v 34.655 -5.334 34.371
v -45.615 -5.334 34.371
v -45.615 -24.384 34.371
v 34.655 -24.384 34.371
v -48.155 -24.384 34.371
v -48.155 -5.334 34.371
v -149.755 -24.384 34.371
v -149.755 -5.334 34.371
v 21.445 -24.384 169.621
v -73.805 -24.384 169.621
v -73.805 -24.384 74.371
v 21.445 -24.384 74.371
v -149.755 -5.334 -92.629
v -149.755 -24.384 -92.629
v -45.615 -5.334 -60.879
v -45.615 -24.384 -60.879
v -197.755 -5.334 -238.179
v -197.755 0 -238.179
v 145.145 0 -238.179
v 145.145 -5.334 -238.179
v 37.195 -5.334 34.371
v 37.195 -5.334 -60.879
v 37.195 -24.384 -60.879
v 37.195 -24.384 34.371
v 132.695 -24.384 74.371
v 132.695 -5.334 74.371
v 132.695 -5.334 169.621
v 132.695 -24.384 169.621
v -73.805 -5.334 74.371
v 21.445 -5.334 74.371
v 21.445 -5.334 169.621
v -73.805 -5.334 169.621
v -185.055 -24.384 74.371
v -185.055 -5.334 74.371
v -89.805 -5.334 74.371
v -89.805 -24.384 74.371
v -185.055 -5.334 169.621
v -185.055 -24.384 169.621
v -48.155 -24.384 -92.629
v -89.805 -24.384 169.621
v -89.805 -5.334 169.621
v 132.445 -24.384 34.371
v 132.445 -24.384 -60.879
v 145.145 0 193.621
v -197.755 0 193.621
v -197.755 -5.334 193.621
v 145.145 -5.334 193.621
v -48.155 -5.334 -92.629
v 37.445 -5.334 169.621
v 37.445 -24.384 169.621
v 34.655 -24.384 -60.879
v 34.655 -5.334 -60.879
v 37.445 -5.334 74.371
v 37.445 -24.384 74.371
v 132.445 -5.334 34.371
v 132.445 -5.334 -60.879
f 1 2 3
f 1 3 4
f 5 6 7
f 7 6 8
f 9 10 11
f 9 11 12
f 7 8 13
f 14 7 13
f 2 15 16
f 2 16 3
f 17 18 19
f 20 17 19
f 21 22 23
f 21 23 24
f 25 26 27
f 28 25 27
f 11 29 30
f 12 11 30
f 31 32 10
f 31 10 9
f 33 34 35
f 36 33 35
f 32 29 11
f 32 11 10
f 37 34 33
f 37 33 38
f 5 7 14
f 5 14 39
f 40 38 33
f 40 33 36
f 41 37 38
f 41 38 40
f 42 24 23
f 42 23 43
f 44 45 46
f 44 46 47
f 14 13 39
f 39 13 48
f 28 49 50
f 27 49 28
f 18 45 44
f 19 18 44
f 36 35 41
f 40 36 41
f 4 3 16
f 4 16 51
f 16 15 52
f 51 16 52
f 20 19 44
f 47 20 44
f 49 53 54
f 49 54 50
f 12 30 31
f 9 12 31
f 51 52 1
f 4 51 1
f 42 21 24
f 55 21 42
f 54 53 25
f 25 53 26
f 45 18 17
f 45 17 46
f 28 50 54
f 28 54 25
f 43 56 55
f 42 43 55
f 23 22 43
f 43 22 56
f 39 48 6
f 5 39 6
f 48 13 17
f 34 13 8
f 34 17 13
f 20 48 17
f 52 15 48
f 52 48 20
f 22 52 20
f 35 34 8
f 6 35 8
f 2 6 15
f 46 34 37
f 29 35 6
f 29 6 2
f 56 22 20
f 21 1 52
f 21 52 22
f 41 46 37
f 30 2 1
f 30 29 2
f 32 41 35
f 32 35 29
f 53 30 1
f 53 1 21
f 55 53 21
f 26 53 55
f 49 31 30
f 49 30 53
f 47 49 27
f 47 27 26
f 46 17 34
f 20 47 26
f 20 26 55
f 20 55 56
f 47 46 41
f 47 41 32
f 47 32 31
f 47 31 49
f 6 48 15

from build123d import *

# Parameters (mm, degrees)
F0_W     = 342.9
F0_H     = 431.8
F1_DEPTH = 5.334
F2_W     = 95.25
F2_H     = 95.25
F2_W_2   = 80.27
F3_DEPTH = 19.05


# Not quite as in the source:
# - a feature names something its author has since deleted; it is built from what else it names


with BuildPart() as f1:
    # F0 (on Front) → F1 (new body)
    with BuildSketch(Plane.XZ):
        with Locations((-26.3048716933, -22.2786769863)):
            Rectangle(F0_W, F0_H)
    extrude(amount=F1_DEPTH)

    # F2 (on face) → F3 (join)
    with BuildSketch(Plane.XZ.offset(5.334)):
        with Locations((-137.4298716933, 121.9963230137)):
            Rectangle(F2_W, F2_H)
        with Locations((-26.1798716933, 121.9963230137)):
            Rectangle(F2_W, F2_H)
        with Locations((85.0701283067, 121.9963230137)):
            Rectangle(F2_W, F2_H)
        Polygon((-48.1548716933, 34.3713230137), (-149.7548716933, 34.3713230137), (-149.7548716933, -92.6286769863), (-48.1548716933, -92.6286769863), (-48.1548716933, -60.8786769863), align=None)
        with Locations((-5.4798716933, -13.2536769863)):
            Rectangle(F2_W_2, F2_H)
        with Locations((84.8201283067, -13.2536769863)):
            Rectangle(F2_W, F2_H)
    extrude(amount=F3_DEPTH)


solid = f1.part
